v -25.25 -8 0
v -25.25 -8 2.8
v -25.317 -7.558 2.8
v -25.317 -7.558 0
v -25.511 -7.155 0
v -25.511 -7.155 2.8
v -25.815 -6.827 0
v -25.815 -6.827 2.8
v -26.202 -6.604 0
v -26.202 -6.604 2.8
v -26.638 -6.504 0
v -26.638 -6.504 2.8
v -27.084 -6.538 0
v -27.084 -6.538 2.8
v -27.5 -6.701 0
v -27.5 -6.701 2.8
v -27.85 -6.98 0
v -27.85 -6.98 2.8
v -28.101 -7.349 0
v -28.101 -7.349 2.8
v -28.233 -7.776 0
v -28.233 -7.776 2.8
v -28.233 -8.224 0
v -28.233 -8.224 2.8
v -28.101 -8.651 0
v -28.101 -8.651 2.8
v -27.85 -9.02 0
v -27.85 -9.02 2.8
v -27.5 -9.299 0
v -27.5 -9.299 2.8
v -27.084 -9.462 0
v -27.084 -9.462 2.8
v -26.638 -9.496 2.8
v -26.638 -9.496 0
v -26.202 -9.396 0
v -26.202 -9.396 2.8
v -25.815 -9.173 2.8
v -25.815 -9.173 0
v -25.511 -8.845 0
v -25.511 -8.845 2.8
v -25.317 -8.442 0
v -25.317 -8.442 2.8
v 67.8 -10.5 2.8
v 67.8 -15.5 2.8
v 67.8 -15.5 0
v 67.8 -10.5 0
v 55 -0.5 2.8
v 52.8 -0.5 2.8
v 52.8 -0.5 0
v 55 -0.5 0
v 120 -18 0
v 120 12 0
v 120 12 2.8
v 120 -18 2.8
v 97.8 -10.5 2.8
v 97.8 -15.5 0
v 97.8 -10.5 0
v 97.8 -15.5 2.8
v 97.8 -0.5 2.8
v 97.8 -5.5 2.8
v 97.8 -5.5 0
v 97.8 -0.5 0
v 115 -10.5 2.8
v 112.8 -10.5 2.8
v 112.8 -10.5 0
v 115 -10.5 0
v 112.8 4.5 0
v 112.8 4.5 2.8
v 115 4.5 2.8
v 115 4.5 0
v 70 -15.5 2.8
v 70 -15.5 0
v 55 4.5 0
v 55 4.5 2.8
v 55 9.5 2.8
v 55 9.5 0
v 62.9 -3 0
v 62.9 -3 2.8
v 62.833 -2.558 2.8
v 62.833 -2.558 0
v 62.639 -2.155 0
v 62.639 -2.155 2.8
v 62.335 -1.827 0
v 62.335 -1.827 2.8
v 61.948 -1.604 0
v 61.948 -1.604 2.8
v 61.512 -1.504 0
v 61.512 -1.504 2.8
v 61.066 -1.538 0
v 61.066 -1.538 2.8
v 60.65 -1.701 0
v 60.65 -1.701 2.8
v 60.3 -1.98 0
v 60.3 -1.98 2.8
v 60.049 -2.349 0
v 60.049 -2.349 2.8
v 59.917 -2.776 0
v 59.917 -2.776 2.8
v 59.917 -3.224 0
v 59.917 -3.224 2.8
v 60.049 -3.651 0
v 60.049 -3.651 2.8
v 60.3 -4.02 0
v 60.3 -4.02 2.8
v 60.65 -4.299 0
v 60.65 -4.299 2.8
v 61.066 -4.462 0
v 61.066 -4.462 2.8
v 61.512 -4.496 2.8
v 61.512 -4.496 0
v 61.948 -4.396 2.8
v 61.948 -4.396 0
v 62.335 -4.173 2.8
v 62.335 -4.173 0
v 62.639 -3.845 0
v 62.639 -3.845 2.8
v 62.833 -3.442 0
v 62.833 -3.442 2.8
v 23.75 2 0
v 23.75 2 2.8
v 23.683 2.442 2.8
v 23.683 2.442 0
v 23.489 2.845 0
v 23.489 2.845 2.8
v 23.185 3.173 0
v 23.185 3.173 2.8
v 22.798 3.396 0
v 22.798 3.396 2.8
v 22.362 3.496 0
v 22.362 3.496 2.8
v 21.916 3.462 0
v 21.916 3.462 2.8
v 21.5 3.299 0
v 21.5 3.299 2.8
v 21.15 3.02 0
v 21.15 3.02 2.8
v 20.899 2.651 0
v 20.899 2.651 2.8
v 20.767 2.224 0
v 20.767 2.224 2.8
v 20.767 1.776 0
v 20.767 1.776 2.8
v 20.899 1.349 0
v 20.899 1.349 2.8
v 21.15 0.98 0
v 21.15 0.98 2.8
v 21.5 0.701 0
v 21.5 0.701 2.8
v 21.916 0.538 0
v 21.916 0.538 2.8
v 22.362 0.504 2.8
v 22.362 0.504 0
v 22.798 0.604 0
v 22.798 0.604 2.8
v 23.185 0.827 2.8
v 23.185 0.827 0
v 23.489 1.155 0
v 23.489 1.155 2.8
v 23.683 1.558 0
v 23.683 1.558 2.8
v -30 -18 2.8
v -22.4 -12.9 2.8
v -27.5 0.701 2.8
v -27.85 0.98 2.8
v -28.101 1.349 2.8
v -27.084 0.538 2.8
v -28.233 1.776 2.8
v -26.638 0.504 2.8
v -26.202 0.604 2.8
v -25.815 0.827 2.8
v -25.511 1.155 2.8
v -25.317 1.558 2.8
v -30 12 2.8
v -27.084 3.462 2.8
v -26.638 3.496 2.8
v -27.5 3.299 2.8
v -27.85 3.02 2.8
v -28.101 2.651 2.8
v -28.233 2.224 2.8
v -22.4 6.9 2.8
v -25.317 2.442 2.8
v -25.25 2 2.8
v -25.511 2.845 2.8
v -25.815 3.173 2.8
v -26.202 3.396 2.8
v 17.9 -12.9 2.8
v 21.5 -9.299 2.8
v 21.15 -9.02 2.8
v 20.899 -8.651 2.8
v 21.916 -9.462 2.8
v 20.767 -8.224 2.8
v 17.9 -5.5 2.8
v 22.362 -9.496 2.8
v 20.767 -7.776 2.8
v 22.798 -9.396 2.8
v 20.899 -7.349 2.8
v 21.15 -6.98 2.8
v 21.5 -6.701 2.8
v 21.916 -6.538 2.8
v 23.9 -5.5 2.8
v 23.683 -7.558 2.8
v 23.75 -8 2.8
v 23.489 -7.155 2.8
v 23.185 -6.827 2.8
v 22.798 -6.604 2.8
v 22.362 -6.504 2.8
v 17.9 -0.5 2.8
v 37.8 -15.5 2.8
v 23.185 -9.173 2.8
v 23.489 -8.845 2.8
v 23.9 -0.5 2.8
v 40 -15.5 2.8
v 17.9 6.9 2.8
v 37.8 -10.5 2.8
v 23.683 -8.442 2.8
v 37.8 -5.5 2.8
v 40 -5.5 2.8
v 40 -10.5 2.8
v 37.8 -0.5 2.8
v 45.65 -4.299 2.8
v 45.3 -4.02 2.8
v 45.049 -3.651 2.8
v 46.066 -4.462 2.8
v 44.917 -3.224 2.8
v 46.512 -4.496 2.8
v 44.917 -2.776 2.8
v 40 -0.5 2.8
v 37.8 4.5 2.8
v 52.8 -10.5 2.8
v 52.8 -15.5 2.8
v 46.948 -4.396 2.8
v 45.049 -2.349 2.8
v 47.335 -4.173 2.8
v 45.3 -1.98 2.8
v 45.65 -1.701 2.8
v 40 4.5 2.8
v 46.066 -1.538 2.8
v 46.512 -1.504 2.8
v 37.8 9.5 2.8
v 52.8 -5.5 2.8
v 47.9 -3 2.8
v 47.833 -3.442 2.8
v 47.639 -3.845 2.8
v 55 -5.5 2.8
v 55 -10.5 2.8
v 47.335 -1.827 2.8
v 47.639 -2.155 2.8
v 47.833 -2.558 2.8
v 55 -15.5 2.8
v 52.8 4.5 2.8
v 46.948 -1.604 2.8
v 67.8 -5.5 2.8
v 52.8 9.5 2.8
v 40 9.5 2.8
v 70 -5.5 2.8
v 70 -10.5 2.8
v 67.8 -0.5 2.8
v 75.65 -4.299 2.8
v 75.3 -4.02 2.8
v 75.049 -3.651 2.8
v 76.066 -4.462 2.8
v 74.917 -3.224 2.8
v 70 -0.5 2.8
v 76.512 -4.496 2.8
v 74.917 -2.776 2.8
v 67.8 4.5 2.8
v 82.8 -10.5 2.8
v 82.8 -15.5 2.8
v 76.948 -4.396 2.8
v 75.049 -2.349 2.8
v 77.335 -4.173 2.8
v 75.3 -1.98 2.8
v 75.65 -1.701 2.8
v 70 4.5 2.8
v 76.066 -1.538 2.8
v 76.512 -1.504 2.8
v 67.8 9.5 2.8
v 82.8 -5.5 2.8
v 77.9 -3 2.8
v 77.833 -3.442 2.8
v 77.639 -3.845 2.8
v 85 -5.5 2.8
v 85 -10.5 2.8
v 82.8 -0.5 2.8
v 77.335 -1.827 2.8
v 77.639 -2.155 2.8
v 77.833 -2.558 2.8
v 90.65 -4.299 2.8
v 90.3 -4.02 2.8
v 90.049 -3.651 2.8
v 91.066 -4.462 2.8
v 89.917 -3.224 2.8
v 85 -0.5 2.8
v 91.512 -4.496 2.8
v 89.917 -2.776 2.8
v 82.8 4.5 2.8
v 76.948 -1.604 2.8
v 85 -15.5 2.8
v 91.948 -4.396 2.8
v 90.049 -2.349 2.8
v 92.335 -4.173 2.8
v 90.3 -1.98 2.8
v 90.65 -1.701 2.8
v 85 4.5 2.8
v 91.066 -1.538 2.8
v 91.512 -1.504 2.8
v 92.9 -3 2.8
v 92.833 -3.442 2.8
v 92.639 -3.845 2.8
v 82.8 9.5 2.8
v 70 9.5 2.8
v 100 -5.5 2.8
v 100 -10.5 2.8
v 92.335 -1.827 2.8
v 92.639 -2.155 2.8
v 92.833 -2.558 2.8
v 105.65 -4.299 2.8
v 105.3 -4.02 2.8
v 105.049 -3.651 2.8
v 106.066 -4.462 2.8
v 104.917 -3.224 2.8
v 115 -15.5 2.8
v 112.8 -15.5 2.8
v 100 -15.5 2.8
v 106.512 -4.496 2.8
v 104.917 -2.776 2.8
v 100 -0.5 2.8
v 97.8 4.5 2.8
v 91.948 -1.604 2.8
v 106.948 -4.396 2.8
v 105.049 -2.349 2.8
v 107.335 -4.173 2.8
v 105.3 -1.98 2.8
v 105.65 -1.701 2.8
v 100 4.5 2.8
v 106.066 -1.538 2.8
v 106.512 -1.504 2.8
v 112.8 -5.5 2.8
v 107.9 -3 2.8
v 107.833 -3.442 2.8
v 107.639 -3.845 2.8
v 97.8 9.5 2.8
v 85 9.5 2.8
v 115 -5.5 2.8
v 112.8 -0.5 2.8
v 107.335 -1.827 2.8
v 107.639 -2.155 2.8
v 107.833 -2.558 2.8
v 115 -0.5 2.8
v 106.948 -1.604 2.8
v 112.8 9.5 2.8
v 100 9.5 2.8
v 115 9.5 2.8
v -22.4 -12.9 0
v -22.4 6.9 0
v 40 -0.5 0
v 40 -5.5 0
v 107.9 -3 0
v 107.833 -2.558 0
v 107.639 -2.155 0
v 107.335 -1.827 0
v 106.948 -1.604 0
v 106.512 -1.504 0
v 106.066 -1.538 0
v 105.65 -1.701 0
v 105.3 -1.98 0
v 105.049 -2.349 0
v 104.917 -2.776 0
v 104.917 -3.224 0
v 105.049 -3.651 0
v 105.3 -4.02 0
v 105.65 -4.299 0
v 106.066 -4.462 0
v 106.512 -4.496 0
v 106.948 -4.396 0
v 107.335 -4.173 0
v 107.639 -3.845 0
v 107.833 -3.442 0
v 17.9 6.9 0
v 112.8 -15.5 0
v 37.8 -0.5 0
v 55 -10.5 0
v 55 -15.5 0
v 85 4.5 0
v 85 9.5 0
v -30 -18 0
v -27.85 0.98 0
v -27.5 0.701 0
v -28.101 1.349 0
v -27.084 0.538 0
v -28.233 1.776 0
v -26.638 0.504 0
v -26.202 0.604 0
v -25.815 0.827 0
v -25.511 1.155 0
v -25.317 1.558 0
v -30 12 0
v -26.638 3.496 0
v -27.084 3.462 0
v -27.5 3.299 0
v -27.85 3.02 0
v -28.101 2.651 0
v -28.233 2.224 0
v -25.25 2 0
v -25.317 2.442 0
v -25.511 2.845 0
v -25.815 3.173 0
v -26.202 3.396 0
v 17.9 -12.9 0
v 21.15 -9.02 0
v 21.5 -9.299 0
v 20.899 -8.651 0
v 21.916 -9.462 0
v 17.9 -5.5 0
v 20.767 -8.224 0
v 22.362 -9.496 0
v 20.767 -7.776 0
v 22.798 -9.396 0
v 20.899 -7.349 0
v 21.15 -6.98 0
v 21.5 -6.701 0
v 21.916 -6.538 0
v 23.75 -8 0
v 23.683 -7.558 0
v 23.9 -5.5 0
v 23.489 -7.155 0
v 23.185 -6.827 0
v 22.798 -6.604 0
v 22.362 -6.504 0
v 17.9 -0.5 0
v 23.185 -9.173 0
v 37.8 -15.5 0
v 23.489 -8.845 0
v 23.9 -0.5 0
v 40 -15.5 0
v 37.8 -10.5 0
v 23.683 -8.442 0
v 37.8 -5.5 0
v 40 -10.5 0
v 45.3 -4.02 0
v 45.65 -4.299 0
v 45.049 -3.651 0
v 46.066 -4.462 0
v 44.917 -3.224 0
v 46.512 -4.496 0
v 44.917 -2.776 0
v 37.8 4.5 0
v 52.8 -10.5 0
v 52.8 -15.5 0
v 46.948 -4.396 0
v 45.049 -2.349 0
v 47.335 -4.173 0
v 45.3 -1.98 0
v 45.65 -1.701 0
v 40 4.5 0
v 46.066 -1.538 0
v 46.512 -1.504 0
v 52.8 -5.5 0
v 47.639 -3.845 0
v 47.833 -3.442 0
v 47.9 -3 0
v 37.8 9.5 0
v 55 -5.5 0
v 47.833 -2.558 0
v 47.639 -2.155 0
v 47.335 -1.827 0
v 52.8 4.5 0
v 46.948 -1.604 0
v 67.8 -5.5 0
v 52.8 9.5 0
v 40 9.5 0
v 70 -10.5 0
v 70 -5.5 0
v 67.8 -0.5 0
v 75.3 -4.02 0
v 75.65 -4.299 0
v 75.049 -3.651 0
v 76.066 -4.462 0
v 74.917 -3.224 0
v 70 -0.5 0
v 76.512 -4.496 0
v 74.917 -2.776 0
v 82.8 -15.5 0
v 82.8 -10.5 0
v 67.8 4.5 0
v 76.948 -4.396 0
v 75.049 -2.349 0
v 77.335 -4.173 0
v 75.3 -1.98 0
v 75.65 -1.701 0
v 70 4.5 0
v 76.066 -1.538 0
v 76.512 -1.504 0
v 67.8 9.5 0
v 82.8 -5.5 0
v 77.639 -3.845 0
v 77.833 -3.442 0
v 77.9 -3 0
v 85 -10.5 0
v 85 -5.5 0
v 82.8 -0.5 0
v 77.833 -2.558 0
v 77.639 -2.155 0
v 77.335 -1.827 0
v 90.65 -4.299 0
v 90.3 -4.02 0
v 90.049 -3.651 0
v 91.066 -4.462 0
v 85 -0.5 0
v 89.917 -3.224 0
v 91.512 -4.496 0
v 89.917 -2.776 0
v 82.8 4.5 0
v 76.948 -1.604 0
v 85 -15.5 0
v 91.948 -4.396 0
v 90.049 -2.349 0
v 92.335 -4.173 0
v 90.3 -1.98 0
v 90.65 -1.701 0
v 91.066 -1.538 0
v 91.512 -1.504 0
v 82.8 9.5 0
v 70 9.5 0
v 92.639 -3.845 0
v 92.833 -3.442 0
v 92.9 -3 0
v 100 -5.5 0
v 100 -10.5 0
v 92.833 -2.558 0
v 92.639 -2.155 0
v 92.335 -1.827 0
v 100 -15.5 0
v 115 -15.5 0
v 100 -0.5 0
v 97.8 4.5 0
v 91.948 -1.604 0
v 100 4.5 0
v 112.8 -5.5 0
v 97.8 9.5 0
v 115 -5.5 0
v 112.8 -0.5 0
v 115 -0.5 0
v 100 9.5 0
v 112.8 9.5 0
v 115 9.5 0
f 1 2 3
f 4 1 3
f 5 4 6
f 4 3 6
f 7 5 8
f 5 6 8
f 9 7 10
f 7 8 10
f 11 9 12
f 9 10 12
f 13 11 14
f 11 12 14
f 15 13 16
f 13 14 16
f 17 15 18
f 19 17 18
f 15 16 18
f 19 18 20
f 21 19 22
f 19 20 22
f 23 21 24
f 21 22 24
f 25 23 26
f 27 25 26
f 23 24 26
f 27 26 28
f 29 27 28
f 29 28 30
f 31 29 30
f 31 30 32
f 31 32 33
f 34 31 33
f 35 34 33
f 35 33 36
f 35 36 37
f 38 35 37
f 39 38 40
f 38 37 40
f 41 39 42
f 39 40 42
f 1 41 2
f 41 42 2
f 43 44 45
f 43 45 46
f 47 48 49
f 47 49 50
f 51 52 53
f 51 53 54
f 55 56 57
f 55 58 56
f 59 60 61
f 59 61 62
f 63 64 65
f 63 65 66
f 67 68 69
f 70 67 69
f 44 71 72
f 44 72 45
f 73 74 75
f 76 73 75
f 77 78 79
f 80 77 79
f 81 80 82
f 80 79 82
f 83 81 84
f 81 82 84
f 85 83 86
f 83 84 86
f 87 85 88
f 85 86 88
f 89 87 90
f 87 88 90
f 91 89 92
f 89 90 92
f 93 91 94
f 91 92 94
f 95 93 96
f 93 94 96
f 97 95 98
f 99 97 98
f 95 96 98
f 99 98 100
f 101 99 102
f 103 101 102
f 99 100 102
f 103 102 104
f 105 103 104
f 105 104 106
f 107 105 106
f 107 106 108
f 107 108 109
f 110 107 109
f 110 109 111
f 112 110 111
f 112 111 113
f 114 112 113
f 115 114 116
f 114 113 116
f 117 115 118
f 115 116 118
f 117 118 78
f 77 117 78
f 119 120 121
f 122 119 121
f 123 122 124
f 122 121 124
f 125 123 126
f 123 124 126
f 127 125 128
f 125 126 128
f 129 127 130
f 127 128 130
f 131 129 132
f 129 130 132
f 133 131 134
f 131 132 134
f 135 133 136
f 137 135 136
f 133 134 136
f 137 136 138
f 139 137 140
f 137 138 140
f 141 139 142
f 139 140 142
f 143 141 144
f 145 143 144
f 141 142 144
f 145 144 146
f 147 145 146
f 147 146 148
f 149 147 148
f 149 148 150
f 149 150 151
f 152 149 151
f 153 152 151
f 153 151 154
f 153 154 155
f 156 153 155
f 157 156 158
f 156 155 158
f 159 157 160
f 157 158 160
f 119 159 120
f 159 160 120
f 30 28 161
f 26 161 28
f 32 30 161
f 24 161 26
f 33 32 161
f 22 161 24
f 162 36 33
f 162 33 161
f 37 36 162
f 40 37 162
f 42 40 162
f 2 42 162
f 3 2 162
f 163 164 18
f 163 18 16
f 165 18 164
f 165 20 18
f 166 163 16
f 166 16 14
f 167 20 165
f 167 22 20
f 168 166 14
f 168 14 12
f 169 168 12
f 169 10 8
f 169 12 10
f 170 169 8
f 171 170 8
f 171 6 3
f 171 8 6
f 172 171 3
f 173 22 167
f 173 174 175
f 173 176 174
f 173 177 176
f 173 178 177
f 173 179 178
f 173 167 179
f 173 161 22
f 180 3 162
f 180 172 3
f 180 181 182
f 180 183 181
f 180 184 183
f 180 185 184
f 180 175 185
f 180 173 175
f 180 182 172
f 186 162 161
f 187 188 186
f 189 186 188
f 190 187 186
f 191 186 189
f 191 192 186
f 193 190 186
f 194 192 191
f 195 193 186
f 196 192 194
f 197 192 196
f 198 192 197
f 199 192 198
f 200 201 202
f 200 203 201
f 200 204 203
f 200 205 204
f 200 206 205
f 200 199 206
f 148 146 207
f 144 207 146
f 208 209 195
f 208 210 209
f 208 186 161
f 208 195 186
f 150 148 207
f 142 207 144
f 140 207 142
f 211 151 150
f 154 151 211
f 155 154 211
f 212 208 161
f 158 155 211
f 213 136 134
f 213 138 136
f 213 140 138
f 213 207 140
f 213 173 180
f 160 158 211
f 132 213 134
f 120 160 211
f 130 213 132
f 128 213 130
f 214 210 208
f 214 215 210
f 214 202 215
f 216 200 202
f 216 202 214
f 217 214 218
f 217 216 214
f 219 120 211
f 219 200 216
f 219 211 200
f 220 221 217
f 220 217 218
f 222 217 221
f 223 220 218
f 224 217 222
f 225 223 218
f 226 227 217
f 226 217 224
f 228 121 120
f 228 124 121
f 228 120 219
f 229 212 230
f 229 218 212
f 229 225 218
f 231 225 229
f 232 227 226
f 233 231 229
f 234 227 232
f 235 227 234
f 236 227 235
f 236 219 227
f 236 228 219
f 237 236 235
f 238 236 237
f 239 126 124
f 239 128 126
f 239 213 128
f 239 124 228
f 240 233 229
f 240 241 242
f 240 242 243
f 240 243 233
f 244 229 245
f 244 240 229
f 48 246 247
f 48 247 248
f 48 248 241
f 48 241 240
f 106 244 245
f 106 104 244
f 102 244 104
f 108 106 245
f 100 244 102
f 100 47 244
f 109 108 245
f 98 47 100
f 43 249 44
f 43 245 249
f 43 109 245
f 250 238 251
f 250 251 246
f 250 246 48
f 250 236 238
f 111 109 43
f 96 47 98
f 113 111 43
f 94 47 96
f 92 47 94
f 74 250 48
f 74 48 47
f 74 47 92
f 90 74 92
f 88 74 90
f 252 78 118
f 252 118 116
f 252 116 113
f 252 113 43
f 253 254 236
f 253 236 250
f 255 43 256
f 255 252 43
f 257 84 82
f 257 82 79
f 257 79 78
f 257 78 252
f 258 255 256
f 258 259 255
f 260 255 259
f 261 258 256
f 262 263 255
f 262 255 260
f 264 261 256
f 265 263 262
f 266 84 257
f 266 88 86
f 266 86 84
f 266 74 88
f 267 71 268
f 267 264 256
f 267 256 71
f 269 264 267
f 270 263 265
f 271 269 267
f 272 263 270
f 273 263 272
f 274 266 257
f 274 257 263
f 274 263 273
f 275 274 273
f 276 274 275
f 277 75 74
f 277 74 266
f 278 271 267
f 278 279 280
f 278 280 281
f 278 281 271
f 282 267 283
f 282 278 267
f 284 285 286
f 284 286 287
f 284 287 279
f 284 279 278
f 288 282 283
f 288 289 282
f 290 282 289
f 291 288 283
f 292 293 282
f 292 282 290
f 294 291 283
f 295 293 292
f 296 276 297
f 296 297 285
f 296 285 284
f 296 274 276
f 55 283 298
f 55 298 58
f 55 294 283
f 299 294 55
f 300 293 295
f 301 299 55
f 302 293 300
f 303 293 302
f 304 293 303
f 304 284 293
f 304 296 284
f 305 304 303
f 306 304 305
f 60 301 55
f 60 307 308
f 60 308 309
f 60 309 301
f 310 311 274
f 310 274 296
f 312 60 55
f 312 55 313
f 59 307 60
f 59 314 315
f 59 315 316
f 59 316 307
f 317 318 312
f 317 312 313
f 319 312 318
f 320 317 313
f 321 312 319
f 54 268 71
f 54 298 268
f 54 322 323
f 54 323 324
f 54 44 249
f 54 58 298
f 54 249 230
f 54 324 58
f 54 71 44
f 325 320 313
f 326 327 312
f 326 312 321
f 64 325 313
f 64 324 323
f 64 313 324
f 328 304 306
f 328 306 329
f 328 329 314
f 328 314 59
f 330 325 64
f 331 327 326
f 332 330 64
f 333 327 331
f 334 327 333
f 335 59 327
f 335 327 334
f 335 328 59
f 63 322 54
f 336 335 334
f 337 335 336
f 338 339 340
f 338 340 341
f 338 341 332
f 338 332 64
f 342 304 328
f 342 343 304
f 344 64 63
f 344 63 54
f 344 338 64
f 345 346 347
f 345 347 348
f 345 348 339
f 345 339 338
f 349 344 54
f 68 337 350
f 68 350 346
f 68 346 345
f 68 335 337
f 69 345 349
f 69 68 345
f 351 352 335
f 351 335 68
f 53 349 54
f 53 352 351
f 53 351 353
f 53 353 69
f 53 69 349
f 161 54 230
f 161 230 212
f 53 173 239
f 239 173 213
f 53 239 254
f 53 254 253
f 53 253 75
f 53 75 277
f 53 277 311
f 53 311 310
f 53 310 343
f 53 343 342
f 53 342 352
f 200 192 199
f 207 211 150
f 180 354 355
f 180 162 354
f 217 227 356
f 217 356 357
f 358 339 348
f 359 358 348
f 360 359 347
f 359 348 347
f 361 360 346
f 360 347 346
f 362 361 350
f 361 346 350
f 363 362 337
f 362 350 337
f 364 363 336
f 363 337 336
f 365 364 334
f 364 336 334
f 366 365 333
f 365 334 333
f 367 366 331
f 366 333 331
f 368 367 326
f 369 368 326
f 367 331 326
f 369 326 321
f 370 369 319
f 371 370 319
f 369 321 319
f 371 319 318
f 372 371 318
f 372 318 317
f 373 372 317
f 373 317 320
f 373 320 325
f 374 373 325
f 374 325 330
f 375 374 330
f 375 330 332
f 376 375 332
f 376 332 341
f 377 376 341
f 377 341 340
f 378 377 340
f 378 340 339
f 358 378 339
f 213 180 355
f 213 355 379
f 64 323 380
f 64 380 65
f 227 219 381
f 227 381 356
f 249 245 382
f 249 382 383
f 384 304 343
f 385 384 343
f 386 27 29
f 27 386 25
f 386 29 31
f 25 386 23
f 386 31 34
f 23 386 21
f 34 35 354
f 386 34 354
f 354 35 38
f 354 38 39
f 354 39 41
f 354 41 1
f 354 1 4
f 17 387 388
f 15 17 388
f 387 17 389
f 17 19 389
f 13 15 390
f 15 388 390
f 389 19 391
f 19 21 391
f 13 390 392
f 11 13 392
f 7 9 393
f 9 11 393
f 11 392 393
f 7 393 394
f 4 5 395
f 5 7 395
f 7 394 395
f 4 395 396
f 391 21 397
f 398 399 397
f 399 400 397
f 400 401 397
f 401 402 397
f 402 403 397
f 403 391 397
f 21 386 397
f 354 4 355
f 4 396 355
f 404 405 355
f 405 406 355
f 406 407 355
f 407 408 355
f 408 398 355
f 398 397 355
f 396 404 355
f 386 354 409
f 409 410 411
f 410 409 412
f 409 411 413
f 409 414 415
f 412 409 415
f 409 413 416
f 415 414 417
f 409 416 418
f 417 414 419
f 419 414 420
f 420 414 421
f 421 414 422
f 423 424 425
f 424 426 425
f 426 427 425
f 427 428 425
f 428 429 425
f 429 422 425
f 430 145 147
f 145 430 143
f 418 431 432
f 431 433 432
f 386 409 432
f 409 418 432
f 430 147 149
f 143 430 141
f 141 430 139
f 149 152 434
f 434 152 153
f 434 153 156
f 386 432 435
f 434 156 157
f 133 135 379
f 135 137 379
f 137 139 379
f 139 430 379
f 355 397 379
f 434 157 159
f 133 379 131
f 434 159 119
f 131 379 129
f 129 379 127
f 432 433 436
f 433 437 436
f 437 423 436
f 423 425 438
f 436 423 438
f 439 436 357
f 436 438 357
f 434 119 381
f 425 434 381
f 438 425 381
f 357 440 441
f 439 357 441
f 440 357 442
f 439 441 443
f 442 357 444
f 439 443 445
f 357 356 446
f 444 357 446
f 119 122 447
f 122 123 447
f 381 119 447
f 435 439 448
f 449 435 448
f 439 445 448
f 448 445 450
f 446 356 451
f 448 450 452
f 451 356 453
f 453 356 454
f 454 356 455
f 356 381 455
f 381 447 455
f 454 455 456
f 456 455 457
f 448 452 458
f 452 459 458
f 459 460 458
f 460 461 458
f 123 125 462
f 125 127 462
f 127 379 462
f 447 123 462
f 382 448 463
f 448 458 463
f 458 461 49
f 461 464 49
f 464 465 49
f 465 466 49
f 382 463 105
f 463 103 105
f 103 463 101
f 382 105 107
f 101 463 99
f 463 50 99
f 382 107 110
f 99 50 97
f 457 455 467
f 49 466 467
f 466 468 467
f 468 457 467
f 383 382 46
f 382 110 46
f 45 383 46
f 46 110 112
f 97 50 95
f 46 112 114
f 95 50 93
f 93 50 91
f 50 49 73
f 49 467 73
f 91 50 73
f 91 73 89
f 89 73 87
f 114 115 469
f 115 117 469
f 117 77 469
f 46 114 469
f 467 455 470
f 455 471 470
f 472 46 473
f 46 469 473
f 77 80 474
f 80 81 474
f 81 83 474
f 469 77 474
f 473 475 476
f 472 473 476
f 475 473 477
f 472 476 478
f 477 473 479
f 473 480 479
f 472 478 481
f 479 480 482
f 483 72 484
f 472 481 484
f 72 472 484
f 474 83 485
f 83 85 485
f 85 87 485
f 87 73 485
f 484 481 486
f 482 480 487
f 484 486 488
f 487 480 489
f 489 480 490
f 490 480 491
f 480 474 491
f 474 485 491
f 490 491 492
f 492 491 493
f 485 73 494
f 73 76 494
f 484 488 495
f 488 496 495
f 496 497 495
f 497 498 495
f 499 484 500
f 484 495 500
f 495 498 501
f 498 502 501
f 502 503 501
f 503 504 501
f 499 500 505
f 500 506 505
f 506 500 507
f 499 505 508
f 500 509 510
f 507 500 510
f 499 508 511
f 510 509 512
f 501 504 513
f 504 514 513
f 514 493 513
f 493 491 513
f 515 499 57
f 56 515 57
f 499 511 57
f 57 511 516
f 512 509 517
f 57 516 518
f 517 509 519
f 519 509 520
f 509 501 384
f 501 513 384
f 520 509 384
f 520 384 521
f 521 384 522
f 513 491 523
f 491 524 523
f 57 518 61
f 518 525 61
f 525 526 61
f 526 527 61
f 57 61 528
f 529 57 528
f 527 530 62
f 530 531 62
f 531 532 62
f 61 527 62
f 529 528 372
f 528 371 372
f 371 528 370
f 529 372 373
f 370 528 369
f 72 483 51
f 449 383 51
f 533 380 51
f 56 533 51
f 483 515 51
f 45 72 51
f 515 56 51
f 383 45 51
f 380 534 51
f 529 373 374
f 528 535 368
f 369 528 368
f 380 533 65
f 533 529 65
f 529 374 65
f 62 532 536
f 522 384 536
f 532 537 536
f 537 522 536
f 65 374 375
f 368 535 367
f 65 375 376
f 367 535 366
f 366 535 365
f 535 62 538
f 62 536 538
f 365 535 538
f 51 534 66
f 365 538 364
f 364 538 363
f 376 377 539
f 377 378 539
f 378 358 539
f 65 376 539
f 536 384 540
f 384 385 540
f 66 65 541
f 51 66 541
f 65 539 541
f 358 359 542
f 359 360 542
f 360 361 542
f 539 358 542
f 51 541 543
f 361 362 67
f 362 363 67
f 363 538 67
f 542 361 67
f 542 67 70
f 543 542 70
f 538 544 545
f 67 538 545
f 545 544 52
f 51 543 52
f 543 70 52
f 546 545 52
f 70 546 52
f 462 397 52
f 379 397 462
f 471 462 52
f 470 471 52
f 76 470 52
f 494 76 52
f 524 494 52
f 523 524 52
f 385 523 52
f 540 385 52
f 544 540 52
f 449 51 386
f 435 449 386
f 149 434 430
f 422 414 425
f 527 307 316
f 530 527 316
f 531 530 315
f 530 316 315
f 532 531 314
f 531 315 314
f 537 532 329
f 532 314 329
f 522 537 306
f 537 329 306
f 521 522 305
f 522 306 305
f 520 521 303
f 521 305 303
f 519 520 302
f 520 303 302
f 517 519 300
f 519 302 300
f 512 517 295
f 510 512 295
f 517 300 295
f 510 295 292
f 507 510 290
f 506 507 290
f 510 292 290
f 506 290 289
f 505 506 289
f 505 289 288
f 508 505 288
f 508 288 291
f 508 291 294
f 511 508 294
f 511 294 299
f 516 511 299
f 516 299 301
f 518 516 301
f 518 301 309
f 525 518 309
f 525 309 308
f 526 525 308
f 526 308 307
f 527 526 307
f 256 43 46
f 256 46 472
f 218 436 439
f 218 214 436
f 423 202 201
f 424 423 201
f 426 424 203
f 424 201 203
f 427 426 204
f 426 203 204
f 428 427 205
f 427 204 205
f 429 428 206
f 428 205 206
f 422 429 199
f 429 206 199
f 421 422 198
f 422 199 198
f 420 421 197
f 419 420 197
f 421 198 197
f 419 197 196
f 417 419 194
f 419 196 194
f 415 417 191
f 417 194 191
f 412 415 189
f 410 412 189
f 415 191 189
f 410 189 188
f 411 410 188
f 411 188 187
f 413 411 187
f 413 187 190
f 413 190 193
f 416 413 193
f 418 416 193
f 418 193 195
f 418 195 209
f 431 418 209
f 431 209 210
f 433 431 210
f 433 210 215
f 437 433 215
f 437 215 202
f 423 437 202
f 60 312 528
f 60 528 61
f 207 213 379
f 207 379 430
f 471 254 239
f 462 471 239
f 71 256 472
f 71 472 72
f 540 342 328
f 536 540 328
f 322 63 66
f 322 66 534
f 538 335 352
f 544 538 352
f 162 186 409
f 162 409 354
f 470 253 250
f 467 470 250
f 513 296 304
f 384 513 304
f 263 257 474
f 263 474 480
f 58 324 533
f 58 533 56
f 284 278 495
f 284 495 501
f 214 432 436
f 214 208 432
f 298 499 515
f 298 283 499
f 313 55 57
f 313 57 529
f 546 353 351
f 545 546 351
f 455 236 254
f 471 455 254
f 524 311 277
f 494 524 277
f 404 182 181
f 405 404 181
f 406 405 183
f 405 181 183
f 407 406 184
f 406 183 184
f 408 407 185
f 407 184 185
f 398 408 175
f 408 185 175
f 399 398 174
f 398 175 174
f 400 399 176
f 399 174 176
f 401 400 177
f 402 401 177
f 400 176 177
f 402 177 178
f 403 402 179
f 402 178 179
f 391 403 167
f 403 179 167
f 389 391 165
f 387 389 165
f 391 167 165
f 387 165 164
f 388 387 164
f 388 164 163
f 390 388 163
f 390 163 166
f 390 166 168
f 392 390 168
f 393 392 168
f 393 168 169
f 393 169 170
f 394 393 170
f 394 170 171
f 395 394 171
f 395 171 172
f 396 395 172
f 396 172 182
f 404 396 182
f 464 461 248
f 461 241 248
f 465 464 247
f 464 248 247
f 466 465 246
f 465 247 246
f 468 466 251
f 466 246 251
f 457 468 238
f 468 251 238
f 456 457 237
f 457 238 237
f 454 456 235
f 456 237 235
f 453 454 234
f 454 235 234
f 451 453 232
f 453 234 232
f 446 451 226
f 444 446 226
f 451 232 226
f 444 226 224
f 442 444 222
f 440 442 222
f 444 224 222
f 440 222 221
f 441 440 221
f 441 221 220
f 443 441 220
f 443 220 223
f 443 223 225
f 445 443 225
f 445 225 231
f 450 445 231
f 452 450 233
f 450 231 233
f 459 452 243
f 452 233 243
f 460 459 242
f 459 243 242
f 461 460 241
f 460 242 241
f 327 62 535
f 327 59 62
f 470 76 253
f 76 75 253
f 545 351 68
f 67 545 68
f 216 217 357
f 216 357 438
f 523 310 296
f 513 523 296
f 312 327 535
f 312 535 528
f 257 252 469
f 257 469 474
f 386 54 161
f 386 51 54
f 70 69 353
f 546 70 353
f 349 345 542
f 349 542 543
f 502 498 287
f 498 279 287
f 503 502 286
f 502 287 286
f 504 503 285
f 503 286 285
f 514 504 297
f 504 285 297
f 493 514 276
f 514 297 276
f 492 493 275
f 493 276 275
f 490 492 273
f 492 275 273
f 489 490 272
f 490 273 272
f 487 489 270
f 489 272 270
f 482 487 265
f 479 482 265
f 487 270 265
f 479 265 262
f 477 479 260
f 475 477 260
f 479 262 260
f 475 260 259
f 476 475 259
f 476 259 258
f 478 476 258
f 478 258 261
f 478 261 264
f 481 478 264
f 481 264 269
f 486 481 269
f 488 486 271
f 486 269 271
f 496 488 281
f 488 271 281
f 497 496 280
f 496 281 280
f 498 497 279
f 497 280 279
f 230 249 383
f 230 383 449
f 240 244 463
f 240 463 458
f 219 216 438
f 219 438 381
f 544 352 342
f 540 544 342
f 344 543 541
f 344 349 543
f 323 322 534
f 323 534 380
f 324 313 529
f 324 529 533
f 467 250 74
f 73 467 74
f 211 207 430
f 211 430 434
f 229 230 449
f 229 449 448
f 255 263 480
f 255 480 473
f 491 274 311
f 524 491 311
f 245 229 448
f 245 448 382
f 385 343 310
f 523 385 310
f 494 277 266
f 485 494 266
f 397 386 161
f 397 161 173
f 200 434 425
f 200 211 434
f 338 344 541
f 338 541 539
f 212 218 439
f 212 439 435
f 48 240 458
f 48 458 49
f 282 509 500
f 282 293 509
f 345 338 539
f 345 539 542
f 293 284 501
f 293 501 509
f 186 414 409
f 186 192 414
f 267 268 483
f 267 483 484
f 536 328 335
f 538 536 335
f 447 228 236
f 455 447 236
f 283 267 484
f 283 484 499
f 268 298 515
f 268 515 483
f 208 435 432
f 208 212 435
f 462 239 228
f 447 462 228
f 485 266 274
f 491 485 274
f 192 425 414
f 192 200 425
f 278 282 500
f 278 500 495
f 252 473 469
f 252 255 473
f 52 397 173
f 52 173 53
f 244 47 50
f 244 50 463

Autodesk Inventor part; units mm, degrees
ref_plane "YZ Plane" through (0, 0, 0) normal (1, 0, 0) x (0, 1, 0)
ref_plane "XZ Plane" through (0, 0, 0) normal (0, 1, 0) x (-1, 0, 0)
ref_plane "XY Plane" through (0, 0, 0) normal (0, 0, 1) x (1, 0, 0)
sketch "Sketch1" plane through (0, 0, 0) normal (0, 0, 1) x (1, 0, 0)
  line L0 (-30, -18) -> (-30, 12)
  line L1 (-30, 12) -> (120, 12)
  line L2 (120, 12) -> (120, -18)
  line L3 (120, -18) -> (-30, -18)
  point P0 (-30, -3)
  dimension "d13" = 30
  dimension "d55" = 150
extrude "Extrusion1" add sketch "Sketch1" along normal blind 2.8
sketch "Sketch4" plane through (0, 0, 2.8) normal (0, 0, 1) x (1, 0, 0)
  line L0 (-22.4, 6.9) -> (17.9, 6.9)
  line L1 (17.9, -0.5) -> (23.9, -0.5)
  line L2 (17.9, -12.9) -> (-22.4, -12.9)
  line L3 (17.9, -5.5) -> (17.9, -12.9)
  line L4 (17.9, -5.5) -> (17.9, -12.9)
  line L5 (23.9, -5.5) -> (17.9, -5.5)
  line L6 (-22.4, -12.9) -> (-22.4, 6.9)
  line L7 (23.9, -0.5) -> (23.9, -5.5)
  line L8 (17.9, 6.9) -> (17.9, -0.5)
  circle A0 centre (-26.75, -8) radius 2.5
  circle A1 centre (-26.75, 2) radius 2.5
  circle A2 centre (22.25, -8) radius 2.5
  circle A3 centre (22.25, 2) radius 2.5
  circle A4 centre (22.25, -8) radius 1.5
  circle A5 centre (22.25, 2) radius 1.5
  circle A6 centre (-26.75, -8) radius 1.5
  circle A7 centre (-26.75, 2) radius 1.5
  line L9 (120, 12) -> (120, -18) projected
  line L10 (-30, -18) -> (-30, 12) projected
  line L11 (120, -18) -> (-30, -18) projected
  line L12 (120, -3) -> (-30, -3)
  line L13 (112.8, -0.5) -> (115, -0.5)
  line L14 (115, -0.5) -> (115, -5.5)
  line L15 (115, -5.5) -> (112.8, -5.5)
  line L16 (112.8, -5.5) -> (112.8, -0.5)
  line L17 (97.8, -0.5) -> (100, -0.5)
  line L18 (100, -0.5) -> (100, -5.5)
  line L19 (100, -5.5) -> (97.8, -5.5)
  line L20 (97.8, -5.5) -> (97.8, -0.5)
  line L21 (82.8, -0.5) -> (85, -0.5)
  line L22 (85, -0.5) -> (85, -5.5)
  line L23 (85, -5.5) -> (82.8, -5.5)
  line L24 (82.8, -5.5) -> (82.8, -0.5)
  line L25 (67.8, -0.5) -> (70, -0.5)
  line L26 (70, -0.5) -> (70, -5.5)
  line L27 (70, -5.5) -> (67.8, -5.5)
  line L28 (67.8, -5.5) -> (67.8, -0.5)
  line L29 (52.8, -0.5) -> (55, -0.5)
  line L30 (55, -0.5) -> (55, -5.5)
  line L31 (55, -5.5) -> (52.8, -5.5)
  line L32 (52.8, -5.5) -> (52.8, -0.5)
  line L33 (37.8, -0.5) -> (40, -0.5)
  line L34 (40, -0.5) -> (40, -5.5)
  line L35 (40, -5.5) -> (37.8, -5.5)
  line L36 (37.8, -5.5) -> (37.8, -0.5)
  line L37 (112.8, -10.5) -> (115, -10.5)
  line L38 (115, -10.5) -> (115, -15.5)
  line L39 (115, -15.5) -> (112.8, -15.5)
  line L40 (112.8, -15.5) -> (112.8, -10.5)
  line L41 (97.8, -10.5) -> (100, -10.5)
  line L42 (100, -10.5) -> (100, -15.5)
  line L43 (100, -15.5) -> (97.8, -15.5)
  line L44 (97.8, -15.5) -> (97.8, -10.5)
  line L45 (82.8, -10.5) -> (85, -10.5)
  line L46 (85, -10.5) -> (85, -15.5)
  line L47 (85, -15.5) -> (82.8, -15.5)
  line L48 (82.8, -15.5) -> (82.8, -10.5)
  line L49 (67.8, -10.5) -> (70, -10.5)
  line L50 (70, -10.5) -> (70, -15.5)
  line L51 (70, -15.5) -> (67.8, -15.5)
  line L52 (67.8, -15.5) -> (67.8, -10.5)
  line L53 (52.8, -10.5) -> (55, -10.5)
  line L54 (55, -10.5) -> (55, -15.5)
  line L55 (55, -15.5) -> (52.8, -15.5)
  line L56 (52.8, -15.5) -> (52.8, -10.5)
  line L57 (37.8, -10.5) -> (40, -10.5)
  line L58 (40, -10.5) -> (40, -15.5)
  line L59 (40, -15.5) -> (37.8, -15.5)
  line L60 (37.8, -15.5) -> (37.8, -10.5)
  line L61 (112.8, 9.5) -> (112.8, 4.5)
  line L62 (115, 4.5) -> (115, 9.5)
  line L63 (115, 9.5) -> (112.8, 9.5)
  line L64 (112.8, 4.5) -> (115, 4.5)
  line L65 (97.8, 9.5) -> (97.8, 4.5)
  line L66 (100, 4.5) -> (100, 9.5)
  line L67 (100, 9.5) -> (97.8, 9.5)
  line L68 (97.8, 4.5) -> (100, 4.5)
  line L69 (82.8, 9.5) -> (82.8, 4.5)
  line L70 (85, 4.5) -> (85, 9.5)
  line L71 (85, 9.5) -> (82.8, 9.5)
  line L72 (82.8, 4.5) -> (85, 4.5)
  line L73 (67.8, 9.5) -> (67.8, 4.5)
  line L74 (70, 4.5) -> (70, 9.5)
  line L75 (70, 9.5) -> (67.8, 9.5)
  line L76 (67.8, 4.5) -> (70, 4.5)
  line L77 (52.8, 9.5) -> (52.8, 4.5)
  line L78 (55, 4.5) -> (55, 9.5)
  line L79 (55, 9.5) -> (52.8, 9.5)
  line L80 (52.8, 4.5) -> (55, 4.5)
  line L81 (37.8, 9.5) -> (37.8, 4.5)
  line L82 (40, 4.5) -> (40, 9.5)
  line L83 (40, 9.5) -> (37.8, 9.5)
  line L84 (37.8, 4.5) -> (40, 4.5)
  circle A8 centre (106.4, -3) radius 1.5
  circle A9 centre (91.4, -3) radius 1.5
  circle A10 centre (76.4, -3) radius 1.5
  circle A11 centre (61.4, -3) radius 1.5
  circle A12 centre (46.4, -3) radius 1.5
  dimension "d51" = 3
  dimension "d52" = 3
  dimension "d53" = 3
  dimension "d54" = 3
  dimension "d56" = 2.2
  dimension "d57" = 5
  dimension "d58" = 2.5
  dimension "d59" = 5
  dimension "d62" = 15
  dimension "d65" = 10
  dimension "d68" = 3
  dimension "d69" = 6.4
  dimension "d72" = 15
extrude "Extrusion3" cut sketch "Sketch4" against normal blind 10 contours L0 L8 L1 L7 L12 L6 | L12 L7 L5 L3 L2 L6 | L36 L33 L34 L12 | L12 L34 L35 L36 | A12 L12 | L12 A12 | L14 L15 L16 L12 | L12 L16 L13 L14 | L32 L29 L30 L12 | L12 L30 L31 L32 | A8 L12 | L12 A8 | A11 L12 | L12 A11 | L18 L19 L20 L12 | L12 L20 L17 L18 | L28 L25 L26 L12 | L12 L26 L27 L28 | A9 L12 | L12 A9 | A10 L12 | L12 A10 | L22 L23 L24 L12 | L12 L24 L21 L22 | A4 | A5 | A6 | A7 | L37 L38 L39 L40 | L41 L42 L43 L44 | L45 L46 L47 L48 | L49 L50 L51 L52 | L53 L54 L55 L56 | L57 L58 L59 L60 | L63 L62 L64 L61 | L67 L66 L68 L65 | L71 L70 L72 L69 | L75 L74 L76 L73 | L79 L78 L80 L77 | L83 L82 L84 L81
properties part number "Acrylic_UpperArm"
